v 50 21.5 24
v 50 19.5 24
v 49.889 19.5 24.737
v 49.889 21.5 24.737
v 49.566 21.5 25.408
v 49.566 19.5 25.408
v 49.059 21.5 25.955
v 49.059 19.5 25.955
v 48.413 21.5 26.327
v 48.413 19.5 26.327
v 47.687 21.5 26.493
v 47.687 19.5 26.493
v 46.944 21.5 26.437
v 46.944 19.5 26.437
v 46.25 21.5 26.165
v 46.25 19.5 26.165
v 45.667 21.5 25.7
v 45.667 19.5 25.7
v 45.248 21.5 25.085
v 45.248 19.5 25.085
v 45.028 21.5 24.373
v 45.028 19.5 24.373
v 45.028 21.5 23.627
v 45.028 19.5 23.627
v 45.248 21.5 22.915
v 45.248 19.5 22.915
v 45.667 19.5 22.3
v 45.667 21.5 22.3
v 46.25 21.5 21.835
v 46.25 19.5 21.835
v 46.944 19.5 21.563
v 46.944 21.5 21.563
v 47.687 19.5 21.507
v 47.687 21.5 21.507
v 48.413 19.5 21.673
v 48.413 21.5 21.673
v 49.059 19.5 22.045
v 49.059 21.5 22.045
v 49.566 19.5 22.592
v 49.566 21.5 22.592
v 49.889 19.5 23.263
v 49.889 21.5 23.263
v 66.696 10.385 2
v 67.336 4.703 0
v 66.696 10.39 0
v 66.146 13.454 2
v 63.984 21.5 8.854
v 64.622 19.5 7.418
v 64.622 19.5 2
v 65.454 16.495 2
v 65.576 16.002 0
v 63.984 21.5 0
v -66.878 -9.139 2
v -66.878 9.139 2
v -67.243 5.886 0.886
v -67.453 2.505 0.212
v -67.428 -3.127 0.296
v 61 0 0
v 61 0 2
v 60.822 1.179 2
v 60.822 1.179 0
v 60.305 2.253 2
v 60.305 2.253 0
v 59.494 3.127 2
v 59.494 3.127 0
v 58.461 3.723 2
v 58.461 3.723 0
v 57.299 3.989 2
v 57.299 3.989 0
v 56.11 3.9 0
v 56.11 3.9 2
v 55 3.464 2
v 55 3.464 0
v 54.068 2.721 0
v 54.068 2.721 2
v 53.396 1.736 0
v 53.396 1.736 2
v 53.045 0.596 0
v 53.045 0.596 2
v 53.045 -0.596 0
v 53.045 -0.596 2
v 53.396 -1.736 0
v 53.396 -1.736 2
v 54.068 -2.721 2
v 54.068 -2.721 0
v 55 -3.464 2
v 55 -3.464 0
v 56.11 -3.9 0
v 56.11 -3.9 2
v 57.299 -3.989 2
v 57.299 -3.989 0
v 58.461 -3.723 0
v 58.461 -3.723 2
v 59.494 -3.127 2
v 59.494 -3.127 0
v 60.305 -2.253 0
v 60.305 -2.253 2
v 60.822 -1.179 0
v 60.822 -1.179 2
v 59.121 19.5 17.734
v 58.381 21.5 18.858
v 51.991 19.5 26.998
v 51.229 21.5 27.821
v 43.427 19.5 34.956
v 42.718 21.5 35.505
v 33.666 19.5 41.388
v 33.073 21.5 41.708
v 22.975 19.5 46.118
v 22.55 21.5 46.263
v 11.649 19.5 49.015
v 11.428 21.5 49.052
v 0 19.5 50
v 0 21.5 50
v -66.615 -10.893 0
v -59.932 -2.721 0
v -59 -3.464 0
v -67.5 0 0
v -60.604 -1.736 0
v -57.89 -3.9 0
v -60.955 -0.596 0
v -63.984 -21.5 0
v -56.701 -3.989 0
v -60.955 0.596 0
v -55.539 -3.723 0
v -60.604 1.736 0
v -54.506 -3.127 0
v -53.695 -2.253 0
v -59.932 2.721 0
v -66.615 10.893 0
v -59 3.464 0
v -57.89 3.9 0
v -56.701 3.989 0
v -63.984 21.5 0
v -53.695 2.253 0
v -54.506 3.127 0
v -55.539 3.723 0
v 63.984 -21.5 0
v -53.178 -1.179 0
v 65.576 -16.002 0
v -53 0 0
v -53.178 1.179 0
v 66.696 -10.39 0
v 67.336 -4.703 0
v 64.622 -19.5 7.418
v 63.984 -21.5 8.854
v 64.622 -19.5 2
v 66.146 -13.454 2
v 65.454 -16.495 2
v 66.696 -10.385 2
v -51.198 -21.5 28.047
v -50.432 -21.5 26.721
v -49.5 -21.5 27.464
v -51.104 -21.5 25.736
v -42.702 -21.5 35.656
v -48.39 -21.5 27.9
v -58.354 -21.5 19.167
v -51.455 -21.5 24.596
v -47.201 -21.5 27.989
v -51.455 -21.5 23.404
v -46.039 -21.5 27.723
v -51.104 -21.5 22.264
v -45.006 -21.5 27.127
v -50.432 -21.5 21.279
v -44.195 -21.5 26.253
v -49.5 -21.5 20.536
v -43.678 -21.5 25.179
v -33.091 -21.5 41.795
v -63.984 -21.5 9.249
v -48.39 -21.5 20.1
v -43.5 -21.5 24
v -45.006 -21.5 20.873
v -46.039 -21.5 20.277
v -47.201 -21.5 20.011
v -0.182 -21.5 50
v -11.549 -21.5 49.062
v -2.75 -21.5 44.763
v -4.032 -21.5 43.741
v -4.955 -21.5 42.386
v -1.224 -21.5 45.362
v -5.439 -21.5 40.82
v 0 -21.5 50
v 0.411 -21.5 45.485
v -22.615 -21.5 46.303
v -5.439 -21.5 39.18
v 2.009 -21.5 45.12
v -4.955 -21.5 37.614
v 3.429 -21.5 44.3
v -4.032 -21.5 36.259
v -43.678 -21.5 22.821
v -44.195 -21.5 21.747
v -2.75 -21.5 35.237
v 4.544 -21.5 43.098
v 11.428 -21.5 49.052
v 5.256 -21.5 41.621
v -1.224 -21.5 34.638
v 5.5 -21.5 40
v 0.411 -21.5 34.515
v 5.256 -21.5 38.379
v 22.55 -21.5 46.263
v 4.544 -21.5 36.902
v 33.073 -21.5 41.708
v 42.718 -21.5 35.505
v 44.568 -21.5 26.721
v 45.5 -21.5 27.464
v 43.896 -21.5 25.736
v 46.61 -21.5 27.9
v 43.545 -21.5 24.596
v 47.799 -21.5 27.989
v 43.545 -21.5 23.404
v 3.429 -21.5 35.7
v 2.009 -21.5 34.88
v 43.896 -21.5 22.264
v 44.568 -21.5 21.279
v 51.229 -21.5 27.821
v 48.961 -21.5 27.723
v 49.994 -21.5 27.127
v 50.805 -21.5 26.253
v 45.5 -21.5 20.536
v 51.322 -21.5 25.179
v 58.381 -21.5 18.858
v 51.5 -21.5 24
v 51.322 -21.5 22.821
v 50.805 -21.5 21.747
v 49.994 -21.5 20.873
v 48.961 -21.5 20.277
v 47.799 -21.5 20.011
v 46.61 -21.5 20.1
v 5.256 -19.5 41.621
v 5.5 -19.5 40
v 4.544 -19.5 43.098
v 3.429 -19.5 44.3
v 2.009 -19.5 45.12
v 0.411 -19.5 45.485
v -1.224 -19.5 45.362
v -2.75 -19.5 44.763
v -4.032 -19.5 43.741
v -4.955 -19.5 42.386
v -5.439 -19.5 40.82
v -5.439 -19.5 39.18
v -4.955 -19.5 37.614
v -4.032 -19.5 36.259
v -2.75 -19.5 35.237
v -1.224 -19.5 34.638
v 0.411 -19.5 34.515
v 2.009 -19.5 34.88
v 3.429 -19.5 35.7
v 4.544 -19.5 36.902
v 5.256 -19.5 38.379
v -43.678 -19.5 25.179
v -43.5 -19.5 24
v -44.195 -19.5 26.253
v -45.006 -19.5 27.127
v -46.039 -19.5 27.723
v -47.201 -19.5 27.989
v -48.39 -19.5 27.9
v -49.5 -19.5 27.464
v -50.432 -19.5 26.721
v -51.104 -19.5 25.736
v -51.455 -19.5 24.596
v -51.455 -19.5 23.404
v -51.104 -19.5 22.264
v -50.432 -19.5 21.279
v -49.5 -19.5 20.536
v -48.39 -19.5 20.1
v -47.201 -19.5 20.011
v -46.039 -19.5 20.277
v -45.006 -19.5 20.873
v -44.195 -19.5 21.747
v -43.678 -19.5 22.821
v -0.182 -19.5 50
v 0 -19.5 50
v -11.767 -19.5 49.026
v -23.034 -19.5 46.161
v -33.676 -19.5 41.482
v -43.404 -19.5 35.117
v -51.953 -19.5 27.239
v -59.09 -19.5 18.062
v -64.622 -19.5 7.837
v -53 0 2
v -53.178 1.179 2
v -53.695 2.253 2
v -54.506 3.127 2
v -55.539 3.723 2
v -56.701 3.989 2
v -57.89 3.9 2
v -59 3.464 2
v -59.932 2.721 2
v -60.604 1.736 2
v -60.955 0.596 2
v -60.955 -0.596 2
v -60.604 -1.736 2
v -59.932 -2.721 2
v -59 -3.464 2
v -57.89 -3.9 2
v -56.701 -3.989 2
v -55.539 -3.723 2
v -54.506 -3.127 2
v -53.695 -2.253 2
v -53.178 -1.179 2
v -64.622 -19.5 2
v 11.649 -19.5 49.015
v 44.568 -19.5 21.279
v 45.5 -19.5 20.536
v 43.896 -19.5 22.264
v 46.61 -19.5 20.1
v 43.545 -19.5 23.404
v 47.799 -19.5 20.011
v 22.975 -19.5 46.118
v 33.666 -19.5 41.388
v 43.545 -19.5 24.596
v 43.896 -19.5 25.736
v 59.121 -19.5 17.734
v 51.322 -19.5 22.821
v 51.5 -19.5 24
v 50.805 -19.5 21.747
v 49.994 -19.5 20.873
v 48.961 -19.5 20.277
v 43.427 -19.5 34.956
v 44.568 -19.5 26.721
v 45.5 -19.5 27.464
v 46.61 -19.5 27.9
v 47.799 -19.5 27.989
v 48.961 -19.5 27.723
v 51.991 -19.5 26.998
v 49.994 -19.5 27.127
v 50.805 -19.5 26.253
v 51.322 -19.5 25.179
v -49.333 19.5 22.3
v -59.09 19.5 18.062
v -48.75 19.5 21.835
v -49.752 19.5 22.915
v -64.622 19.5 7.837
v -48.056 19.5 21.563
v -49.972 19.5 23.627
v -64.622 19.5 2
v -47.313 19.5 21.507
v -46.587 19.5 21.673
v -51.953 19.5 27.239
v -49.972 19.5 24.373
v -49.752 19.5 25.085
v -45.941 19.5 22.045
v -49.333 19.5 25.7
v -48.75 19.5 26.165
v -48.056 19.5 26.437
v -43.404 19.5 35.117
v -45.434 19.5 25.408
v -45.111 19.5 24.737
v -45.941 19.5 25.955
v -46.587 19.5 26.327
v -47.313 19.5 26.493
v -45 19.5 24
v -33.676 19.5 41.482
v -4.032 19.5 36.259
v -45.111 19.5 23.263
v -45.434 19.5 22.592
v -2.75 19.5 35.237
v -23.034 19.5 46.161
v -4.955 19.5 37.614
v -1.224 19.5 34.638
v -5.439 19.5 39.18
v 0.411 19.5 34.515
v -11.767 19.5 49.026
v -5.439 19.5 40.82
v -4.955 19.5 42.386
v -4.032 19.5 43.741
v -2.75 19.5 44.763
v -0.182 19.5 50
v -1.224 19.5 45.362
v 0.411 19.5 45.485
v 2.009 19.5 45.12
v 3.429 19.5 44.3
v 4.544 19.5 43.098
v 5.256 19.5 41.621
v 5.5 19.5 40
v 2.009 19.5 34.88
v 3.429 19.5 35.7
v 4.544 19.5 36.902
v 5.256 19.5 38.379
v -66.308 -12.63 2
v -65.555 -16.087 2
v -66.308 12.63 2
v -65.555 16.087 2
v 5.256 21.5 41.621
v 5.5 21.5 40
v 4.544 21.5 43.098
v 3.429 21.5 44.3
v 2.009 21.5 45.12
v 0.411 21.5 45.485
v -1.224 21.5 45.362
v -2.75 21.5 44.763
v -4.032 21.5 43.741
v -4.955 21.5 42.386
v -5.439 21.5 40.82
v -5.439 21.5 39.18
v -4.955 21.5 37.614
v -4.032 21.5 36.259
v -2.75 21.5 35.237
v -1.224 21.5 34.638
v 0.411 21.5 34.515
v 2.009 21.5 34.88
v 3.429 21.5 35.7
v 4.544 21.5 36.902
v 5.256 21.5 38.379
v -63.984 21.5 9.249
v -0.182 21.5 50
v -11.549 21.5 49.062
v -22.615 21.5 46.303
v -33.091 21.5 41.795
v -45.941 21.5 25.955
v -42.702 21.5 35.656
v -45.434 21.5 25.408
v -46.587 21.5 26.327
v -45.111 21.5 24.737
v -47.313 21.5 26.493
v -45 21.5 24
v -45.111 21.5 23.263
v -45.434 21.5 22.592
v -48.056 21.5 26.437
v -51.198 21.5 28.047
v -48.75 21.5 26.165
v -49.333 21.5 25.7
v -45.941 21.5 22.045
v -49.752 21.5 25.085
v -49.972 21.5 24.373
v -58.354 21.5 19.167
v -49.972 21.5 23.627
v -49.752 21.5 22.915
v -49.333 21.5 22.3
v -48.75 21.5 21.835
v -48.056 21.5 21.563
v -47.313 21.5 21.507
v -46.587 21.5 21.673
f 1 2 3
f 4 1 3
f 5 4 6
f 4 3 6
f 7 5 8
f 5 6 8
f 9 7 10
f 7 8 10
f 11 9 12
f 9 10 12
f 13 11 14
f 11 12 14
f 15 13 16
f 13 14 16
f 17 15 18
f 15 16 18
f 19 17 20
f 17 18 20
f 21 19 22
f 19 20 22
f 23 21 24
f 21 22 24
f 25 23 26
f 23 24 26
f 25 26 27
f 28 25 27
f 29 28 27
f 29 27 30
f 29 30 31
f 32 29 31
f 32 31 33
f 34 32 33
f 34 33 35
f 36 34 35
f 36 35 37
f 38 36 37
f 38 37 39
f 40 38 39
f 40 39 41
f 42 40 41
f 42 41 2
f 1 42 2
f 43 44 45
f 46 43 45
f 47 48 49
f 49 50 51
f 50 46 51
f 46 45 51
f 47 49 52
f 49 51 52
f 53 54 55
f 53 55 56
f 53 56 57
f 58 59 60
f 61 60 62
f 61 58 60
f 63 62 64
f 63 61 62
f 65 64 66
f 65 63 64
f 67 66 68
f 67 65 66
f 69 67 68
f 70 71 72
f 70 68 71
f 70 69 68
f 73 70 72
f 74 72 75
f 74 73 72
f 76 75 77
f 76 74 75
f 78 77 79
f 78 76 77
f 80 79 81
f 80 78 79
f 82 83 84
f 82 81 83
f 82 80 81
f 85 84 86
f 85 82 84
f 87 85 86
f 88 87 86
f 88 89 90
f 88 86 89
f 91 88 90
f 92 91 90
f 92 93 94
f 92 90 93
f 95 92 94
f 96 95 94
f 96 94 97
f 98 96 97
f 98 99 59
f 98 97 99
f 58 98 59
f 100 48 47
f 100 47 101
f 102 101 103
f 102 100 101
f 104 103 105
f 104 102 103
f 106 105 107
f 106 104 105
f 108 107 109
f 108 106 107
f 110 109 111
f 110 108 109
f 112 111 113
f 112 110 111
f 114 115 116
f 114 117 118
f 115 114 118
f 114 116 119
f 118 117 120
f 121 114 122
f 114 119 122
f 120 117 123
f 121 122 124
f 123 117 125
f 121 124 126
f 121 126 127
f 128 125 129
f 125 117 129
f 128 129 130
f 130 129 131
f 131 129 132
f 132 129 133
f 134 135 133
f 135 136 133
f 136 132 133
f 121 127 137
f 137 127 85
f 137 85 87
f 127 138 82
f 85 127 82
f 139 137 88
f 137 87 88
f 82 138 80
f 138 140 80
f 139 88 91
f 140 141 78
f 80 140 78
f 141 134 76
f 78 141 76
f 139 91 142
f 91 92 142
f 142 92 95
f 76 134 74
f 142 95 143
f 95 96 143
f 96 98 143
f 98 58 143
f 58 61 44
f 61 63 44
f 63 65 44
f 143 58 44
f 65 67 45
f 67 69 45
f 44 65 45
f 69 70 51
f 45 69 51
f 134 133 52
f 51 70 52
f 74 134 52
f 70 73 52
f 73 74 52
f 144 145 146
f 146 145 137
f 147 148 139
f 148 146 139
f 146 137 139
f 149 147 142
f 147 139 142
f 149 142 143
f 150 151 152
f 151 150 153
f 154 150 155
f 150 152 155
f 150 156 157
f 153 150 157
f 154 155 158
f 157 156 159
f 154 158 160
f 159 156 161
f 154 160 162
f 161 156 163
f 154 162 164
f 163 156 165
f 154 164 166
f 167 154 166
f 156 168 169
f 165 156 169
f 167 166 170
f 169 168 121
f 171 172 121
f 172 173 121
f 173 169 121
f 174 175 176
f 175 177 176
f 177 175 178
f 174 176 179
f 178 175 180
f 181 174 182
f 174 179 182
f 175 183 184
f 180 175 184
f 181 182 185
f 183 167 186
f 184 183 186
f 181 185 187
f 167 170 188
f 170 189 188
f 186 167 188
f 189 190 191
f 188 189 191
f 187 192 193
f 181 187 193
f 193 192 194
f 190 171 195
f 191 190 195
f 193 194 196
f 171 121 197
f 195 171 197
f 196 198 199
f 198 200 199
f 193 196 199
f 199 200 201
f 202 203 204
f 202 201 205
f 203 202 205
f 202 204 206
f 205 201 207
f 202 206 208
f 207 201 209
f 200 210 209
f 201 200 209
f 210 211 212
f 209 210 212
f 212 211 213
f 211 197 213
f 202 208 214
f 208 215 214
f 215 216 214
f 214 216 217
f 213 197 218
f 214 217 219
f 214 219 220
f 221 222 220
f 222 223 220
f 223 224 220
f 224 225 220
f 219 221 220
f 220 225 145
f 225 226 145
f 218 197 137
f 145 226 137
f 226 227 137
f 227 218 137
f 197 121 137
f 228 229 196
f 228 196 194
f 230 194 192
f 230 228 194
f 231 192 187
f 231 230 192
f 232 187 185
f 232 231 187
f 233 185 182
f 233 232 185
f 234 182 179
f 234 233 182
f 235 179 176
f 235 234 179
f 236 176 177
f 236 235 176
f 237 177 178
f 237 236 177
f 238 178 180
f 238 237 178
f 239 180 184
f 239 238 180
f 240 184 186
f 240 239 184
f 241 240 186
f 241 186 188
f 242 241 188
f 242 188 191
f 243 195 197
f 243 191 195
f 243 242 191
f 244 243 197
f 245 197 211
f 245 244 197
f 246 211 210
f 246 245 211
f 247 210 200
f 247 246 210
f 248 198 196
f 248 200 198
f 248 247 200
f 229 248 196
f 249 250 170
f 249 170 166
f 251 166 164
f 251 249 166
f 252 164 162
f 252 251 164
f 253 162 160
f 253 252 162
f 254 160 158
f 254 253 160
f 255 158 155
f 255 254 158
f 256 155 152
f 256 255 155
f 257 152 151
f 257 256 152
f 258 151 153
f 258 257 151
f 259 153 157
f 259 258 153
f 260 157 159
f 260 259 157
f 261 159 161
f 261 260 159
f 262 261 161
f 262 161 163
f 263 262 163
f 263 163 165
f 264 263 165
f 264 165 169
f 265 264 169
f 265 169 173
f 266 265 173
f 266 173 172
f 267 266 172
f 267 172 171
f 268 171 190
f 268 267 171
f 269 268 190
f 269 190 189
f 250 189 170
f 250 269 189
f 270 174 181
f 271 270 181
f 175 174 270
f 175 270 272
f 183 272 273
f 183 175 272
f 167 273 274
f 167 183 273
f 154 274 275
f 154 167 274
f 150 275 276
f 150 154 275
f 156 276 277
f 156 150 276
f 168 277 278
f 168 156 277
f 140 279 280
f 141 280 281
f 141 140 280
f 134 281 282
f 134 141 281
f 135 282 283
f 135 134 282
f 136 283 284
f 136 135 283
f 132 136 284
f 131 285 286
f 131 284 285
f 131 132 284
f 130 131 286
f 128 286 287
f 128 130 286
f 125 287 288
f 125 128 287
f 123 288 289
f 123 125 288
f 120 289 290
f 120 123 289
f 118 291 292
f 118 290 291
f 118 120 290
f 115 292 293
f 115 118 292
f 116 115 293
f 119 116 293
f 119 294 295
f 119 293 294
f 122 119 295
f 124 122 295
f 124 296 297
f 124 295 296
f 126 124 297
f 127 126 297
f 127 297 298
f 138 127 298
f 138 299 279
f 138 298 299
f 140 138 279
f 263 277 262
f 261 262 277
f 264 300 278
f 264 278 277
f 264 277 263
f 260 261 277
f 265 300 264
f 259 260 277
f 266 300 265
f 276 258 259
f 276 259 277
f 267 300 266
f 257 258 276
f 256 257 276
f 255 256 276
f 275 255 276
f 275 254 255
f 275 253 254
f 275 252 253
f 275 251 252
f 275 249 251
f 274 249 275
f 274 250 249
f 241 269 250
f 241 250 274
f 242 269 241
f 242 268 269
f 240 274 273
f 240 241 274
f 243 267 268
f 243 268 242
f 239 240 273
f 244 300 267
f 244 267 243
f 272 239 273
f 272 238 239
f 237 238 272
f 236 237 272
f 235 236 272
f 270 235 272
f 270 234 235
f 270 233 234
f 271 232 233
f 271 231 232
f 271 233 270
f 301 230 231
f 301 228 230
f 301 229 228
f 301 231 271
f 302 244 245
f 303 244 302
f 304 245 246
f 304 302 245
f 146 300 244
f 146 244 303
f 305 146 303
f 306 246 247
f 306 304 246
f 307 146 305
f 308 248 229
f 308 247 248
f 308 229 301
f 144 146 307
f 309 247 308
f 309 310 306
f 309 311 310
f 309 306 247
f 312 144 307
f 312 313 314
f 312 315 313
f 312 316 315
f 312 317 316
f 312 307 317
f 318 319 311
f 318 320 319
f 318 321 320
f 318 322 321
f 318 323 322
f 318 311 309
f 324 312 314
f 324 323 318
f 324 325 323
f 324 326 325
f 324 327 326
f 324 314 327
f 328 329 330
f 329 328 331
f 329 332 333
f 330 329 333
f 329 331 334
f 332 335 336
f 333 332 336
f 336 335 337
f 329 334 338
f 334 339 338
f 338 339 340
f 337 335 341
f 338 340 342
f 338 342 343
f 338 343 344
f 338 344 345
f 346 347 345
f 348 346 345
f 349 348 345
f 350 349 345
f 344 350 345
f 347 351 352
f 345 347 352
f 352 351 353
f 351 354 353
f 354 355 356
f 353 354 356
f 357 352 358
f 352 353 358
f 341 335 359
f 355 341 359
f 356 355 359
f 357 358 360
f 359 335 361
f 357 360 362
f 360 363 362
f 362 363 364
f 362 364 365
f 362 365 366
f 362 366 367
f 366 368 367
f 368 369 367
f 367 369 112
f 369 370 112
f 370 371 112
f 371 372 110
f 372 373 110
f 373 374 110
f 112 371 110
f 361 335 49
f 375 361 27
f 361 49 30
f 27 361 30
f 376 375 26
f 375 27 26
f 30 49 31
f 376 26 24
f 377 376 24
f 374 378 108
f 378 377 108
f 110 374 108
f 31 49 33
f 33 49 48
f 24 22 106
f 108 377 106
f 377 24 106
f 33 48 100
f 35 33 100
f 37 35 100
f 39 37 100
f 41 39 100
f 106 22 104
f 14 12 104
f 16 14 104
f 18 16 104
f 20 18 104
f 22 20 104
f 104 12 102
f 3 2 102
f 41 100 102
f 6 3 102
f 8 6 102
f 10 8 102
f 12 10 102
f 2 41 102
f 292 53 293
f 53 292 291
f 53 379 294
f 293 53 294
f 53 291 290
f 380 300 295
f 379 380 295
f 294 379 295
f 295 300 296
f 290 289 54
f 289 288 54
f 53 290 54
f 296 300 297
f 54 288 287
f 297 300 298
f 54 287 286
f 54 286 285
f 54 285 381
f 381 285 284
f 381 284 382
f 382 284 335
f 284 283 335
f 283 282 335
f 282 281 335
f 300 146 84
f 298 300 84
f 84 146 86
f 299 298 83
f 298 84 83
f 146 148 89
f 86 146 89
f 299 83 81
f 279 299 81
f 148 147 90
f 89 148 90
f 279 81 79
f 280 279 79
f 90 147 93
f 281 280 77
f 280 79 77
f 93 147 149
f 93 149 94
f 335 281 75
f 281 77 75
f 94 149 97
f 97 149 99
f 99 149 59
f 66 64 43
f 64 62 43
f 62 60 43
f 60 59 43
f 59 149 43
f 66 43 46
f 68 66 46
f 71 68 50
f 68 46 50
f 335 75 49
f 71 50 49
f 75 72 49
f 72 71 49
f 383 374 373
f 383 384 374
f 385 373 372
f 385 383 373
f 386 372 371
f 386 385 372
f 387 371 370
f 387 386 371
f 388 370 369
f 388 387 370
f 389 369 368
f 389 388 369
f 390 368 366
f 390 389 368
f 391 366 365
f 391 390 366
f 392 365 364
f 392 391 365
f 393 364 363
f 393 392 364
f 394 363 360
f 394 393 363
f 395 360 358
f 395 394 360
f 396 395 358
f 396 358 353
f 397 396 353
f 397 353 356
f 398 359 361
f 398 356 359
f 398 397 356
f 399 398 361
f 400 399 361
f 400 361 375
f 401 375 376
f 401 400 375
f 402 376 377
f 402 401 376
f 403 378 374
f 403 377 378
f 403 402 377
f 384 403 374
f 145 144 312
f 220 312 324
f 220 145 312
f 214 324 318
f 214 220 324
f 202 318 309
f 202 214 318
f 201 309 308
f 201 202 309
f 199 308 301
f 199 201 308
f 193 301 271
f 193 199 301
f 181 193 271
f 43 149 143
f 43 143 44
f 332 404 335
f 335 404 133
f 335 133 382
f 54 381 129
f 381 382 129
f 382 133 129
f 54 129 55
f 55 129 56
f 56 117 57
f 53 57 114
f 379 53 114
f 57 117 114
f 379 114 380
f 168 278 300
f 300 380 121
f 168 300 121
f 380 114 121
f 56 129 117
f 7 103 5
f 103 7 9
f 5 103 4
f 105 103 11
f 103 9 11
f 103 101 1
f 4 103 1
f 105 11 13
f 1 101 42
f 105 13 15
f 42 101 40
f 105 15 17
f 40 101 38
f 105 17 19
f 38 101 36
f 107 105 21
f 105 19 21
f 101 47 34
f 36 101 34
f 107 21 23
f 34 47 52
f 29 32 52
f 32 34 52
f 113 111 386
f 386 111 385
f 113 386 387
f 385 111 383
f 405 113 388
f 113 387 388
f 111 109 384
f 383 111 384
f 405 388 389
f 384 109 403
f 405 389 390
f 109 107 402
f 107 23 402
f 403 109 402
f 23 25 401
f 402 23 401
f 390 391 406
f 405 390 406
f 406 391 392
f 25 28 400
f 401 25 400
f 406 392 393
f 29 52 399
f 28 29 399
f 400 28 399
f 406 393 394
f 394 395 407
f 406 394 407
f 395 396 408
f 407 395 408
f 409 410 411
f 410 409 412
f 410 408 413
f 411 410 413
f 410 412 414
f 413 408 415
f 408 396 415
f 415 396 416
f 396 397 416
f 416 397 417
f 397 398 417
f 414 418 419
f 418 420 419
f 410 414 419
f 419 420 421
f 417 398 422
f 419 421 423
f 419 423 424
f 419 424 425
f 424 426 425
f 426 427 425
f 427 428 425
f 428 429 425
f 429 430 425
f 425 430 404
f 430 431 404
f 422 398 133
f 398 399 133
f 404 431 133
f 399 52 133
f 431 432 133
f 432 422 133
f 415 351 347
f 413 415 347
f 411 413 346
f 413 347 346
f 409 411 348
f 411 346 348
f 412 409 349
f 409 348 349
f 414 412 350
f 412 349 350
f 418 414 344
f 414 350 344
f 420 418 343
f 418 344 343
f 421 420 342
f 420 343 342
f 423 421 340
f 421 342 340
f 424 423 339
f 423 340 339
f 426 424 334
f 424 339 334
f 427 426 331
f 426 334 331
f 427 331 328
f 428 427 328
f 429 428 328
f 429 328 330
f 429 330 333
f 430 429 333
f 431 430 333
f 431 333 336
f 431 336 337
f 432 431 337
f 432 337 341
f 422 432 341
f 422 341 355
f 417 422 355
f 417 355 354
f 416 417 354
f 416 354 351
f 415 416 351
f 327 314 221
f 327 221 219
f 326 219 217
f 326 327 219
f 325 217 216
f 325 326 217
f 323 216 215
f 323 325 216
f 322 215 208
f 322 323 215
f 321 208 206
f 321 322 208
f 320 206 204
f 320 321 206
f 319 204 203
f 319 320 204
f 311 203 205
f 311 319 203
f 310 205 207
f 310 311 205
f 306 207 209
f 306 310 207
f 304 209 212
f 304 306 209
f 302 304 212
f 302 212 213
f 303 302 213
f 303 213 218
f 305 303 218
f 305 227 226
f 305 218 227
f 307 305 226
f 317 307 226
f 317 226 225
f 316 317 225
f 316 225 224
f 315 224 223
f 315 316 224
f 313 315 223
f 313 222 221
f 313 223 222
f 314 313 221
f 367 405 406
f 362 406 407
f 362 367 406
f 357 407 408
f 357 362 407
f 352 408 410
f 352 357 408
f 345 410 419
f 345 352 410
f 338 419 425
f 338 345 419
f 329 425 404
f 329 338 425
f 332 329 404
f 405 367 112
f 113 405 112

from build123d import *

# Parameters (mm, degrees)
F1_DEPTH  = 50
F2_R      = 5.5
F3_DEPTH  = 22.5
F5_W      = 19.5
F5_H      = 50
F6_DEPTH  = 90
F7_R      = 4
F8_DEPTH  = 50.001
F9_R      = 2.5
F10_DEPTH = 50
F11_R     = 4
F12_DEPTH = 40


with BuildPart() as f1:
    # F0 (on Top) → F1 (new body)
    with BuildSketch(Plane.XY):
        with BuildLine():
            Line((0, -21.5), (63.984373, -21.5))
            ThreePointArc((63.984373, -21.5), (67.5, 0), (63.984373, 21.5))
            Line((63.984373, 21.5), (0, 21.5))
            Line((0, 21.5), (-63.984373, 21.5))
            ThreePointArc((-63.984373, 21.5), (-67.5, 0), (-63.984373, -21.5))
            Line((-63.984373, -21.5), (0, -21.5))
        make_face()
    extrude(amount=F1_DEPTH)


with BuildPart() as f3:
    # F2 (on Front) → F3 (new body, symmetric)
    with BuildSketch(Plane.XZ):
        with BuildLine():
            Line((-67.518182, 0), (67.335986, 0))
            ThreePointArc((67.335986, 0), (-0.091098, 50.000059), (-67.518182, 0))
        make_face()
        with Locations((0, 40)):
            Circle(F2_R, mode=Mode.SUBTRACT)
    extrude(amount=F3_DEPTH, both=True)


with BuildPart() as f1_1:
    add(f1.part)

    # F4: intersect F3
    add(f3.part, mode=Mode.INTERSECT)

    # F5 (on Right) → F6 (cut, symmetric)
    with BuildSketch(Plane.YZ):
        with Locations((-9.75, 27)):
            Rectangle(F5_W, F5_H)
        with Locations((9.75, 27)):
            Rectangle(F5_W, F5_H)
    extrude(amount=F6_DEPTH, both=True, mode=Mode.SUBTRACT)

    # F7 (on Top) → F8 (cut, through all)
    with BuildSketch(Plane.XY):
        with Locations((57, 0)):
            Circle(F7_R)
        with Locations((-57, 0)):
            Circle(F7_R)
    extrude(amount=F8_DEPTH, mode=Mode.SUBTRACT)

    # F9 (on Front) → F10 (cut)
    with BuildSketch(Plane.XZ):
        with Locations((-47.5, 24)):
            Circle(F9_R)
        with Locations((47.5, 24)):
            Circle(F9_R)
    extrude(amount=-F10_DEPTH, mode=Mode.SUBTRACT)

    # F11 (on Front) → F12 (cut)
    with BuildSketch(Plane.XZ):
        with Locations((47.5, 24)):
            Circle(F11_R)
        with Locations((-47.5, 24)):
            Circle(F11_R)
    extrude(amount=F12_DEPTH, mode=Mode.SUBTRACT)


solid = f1_1.part
